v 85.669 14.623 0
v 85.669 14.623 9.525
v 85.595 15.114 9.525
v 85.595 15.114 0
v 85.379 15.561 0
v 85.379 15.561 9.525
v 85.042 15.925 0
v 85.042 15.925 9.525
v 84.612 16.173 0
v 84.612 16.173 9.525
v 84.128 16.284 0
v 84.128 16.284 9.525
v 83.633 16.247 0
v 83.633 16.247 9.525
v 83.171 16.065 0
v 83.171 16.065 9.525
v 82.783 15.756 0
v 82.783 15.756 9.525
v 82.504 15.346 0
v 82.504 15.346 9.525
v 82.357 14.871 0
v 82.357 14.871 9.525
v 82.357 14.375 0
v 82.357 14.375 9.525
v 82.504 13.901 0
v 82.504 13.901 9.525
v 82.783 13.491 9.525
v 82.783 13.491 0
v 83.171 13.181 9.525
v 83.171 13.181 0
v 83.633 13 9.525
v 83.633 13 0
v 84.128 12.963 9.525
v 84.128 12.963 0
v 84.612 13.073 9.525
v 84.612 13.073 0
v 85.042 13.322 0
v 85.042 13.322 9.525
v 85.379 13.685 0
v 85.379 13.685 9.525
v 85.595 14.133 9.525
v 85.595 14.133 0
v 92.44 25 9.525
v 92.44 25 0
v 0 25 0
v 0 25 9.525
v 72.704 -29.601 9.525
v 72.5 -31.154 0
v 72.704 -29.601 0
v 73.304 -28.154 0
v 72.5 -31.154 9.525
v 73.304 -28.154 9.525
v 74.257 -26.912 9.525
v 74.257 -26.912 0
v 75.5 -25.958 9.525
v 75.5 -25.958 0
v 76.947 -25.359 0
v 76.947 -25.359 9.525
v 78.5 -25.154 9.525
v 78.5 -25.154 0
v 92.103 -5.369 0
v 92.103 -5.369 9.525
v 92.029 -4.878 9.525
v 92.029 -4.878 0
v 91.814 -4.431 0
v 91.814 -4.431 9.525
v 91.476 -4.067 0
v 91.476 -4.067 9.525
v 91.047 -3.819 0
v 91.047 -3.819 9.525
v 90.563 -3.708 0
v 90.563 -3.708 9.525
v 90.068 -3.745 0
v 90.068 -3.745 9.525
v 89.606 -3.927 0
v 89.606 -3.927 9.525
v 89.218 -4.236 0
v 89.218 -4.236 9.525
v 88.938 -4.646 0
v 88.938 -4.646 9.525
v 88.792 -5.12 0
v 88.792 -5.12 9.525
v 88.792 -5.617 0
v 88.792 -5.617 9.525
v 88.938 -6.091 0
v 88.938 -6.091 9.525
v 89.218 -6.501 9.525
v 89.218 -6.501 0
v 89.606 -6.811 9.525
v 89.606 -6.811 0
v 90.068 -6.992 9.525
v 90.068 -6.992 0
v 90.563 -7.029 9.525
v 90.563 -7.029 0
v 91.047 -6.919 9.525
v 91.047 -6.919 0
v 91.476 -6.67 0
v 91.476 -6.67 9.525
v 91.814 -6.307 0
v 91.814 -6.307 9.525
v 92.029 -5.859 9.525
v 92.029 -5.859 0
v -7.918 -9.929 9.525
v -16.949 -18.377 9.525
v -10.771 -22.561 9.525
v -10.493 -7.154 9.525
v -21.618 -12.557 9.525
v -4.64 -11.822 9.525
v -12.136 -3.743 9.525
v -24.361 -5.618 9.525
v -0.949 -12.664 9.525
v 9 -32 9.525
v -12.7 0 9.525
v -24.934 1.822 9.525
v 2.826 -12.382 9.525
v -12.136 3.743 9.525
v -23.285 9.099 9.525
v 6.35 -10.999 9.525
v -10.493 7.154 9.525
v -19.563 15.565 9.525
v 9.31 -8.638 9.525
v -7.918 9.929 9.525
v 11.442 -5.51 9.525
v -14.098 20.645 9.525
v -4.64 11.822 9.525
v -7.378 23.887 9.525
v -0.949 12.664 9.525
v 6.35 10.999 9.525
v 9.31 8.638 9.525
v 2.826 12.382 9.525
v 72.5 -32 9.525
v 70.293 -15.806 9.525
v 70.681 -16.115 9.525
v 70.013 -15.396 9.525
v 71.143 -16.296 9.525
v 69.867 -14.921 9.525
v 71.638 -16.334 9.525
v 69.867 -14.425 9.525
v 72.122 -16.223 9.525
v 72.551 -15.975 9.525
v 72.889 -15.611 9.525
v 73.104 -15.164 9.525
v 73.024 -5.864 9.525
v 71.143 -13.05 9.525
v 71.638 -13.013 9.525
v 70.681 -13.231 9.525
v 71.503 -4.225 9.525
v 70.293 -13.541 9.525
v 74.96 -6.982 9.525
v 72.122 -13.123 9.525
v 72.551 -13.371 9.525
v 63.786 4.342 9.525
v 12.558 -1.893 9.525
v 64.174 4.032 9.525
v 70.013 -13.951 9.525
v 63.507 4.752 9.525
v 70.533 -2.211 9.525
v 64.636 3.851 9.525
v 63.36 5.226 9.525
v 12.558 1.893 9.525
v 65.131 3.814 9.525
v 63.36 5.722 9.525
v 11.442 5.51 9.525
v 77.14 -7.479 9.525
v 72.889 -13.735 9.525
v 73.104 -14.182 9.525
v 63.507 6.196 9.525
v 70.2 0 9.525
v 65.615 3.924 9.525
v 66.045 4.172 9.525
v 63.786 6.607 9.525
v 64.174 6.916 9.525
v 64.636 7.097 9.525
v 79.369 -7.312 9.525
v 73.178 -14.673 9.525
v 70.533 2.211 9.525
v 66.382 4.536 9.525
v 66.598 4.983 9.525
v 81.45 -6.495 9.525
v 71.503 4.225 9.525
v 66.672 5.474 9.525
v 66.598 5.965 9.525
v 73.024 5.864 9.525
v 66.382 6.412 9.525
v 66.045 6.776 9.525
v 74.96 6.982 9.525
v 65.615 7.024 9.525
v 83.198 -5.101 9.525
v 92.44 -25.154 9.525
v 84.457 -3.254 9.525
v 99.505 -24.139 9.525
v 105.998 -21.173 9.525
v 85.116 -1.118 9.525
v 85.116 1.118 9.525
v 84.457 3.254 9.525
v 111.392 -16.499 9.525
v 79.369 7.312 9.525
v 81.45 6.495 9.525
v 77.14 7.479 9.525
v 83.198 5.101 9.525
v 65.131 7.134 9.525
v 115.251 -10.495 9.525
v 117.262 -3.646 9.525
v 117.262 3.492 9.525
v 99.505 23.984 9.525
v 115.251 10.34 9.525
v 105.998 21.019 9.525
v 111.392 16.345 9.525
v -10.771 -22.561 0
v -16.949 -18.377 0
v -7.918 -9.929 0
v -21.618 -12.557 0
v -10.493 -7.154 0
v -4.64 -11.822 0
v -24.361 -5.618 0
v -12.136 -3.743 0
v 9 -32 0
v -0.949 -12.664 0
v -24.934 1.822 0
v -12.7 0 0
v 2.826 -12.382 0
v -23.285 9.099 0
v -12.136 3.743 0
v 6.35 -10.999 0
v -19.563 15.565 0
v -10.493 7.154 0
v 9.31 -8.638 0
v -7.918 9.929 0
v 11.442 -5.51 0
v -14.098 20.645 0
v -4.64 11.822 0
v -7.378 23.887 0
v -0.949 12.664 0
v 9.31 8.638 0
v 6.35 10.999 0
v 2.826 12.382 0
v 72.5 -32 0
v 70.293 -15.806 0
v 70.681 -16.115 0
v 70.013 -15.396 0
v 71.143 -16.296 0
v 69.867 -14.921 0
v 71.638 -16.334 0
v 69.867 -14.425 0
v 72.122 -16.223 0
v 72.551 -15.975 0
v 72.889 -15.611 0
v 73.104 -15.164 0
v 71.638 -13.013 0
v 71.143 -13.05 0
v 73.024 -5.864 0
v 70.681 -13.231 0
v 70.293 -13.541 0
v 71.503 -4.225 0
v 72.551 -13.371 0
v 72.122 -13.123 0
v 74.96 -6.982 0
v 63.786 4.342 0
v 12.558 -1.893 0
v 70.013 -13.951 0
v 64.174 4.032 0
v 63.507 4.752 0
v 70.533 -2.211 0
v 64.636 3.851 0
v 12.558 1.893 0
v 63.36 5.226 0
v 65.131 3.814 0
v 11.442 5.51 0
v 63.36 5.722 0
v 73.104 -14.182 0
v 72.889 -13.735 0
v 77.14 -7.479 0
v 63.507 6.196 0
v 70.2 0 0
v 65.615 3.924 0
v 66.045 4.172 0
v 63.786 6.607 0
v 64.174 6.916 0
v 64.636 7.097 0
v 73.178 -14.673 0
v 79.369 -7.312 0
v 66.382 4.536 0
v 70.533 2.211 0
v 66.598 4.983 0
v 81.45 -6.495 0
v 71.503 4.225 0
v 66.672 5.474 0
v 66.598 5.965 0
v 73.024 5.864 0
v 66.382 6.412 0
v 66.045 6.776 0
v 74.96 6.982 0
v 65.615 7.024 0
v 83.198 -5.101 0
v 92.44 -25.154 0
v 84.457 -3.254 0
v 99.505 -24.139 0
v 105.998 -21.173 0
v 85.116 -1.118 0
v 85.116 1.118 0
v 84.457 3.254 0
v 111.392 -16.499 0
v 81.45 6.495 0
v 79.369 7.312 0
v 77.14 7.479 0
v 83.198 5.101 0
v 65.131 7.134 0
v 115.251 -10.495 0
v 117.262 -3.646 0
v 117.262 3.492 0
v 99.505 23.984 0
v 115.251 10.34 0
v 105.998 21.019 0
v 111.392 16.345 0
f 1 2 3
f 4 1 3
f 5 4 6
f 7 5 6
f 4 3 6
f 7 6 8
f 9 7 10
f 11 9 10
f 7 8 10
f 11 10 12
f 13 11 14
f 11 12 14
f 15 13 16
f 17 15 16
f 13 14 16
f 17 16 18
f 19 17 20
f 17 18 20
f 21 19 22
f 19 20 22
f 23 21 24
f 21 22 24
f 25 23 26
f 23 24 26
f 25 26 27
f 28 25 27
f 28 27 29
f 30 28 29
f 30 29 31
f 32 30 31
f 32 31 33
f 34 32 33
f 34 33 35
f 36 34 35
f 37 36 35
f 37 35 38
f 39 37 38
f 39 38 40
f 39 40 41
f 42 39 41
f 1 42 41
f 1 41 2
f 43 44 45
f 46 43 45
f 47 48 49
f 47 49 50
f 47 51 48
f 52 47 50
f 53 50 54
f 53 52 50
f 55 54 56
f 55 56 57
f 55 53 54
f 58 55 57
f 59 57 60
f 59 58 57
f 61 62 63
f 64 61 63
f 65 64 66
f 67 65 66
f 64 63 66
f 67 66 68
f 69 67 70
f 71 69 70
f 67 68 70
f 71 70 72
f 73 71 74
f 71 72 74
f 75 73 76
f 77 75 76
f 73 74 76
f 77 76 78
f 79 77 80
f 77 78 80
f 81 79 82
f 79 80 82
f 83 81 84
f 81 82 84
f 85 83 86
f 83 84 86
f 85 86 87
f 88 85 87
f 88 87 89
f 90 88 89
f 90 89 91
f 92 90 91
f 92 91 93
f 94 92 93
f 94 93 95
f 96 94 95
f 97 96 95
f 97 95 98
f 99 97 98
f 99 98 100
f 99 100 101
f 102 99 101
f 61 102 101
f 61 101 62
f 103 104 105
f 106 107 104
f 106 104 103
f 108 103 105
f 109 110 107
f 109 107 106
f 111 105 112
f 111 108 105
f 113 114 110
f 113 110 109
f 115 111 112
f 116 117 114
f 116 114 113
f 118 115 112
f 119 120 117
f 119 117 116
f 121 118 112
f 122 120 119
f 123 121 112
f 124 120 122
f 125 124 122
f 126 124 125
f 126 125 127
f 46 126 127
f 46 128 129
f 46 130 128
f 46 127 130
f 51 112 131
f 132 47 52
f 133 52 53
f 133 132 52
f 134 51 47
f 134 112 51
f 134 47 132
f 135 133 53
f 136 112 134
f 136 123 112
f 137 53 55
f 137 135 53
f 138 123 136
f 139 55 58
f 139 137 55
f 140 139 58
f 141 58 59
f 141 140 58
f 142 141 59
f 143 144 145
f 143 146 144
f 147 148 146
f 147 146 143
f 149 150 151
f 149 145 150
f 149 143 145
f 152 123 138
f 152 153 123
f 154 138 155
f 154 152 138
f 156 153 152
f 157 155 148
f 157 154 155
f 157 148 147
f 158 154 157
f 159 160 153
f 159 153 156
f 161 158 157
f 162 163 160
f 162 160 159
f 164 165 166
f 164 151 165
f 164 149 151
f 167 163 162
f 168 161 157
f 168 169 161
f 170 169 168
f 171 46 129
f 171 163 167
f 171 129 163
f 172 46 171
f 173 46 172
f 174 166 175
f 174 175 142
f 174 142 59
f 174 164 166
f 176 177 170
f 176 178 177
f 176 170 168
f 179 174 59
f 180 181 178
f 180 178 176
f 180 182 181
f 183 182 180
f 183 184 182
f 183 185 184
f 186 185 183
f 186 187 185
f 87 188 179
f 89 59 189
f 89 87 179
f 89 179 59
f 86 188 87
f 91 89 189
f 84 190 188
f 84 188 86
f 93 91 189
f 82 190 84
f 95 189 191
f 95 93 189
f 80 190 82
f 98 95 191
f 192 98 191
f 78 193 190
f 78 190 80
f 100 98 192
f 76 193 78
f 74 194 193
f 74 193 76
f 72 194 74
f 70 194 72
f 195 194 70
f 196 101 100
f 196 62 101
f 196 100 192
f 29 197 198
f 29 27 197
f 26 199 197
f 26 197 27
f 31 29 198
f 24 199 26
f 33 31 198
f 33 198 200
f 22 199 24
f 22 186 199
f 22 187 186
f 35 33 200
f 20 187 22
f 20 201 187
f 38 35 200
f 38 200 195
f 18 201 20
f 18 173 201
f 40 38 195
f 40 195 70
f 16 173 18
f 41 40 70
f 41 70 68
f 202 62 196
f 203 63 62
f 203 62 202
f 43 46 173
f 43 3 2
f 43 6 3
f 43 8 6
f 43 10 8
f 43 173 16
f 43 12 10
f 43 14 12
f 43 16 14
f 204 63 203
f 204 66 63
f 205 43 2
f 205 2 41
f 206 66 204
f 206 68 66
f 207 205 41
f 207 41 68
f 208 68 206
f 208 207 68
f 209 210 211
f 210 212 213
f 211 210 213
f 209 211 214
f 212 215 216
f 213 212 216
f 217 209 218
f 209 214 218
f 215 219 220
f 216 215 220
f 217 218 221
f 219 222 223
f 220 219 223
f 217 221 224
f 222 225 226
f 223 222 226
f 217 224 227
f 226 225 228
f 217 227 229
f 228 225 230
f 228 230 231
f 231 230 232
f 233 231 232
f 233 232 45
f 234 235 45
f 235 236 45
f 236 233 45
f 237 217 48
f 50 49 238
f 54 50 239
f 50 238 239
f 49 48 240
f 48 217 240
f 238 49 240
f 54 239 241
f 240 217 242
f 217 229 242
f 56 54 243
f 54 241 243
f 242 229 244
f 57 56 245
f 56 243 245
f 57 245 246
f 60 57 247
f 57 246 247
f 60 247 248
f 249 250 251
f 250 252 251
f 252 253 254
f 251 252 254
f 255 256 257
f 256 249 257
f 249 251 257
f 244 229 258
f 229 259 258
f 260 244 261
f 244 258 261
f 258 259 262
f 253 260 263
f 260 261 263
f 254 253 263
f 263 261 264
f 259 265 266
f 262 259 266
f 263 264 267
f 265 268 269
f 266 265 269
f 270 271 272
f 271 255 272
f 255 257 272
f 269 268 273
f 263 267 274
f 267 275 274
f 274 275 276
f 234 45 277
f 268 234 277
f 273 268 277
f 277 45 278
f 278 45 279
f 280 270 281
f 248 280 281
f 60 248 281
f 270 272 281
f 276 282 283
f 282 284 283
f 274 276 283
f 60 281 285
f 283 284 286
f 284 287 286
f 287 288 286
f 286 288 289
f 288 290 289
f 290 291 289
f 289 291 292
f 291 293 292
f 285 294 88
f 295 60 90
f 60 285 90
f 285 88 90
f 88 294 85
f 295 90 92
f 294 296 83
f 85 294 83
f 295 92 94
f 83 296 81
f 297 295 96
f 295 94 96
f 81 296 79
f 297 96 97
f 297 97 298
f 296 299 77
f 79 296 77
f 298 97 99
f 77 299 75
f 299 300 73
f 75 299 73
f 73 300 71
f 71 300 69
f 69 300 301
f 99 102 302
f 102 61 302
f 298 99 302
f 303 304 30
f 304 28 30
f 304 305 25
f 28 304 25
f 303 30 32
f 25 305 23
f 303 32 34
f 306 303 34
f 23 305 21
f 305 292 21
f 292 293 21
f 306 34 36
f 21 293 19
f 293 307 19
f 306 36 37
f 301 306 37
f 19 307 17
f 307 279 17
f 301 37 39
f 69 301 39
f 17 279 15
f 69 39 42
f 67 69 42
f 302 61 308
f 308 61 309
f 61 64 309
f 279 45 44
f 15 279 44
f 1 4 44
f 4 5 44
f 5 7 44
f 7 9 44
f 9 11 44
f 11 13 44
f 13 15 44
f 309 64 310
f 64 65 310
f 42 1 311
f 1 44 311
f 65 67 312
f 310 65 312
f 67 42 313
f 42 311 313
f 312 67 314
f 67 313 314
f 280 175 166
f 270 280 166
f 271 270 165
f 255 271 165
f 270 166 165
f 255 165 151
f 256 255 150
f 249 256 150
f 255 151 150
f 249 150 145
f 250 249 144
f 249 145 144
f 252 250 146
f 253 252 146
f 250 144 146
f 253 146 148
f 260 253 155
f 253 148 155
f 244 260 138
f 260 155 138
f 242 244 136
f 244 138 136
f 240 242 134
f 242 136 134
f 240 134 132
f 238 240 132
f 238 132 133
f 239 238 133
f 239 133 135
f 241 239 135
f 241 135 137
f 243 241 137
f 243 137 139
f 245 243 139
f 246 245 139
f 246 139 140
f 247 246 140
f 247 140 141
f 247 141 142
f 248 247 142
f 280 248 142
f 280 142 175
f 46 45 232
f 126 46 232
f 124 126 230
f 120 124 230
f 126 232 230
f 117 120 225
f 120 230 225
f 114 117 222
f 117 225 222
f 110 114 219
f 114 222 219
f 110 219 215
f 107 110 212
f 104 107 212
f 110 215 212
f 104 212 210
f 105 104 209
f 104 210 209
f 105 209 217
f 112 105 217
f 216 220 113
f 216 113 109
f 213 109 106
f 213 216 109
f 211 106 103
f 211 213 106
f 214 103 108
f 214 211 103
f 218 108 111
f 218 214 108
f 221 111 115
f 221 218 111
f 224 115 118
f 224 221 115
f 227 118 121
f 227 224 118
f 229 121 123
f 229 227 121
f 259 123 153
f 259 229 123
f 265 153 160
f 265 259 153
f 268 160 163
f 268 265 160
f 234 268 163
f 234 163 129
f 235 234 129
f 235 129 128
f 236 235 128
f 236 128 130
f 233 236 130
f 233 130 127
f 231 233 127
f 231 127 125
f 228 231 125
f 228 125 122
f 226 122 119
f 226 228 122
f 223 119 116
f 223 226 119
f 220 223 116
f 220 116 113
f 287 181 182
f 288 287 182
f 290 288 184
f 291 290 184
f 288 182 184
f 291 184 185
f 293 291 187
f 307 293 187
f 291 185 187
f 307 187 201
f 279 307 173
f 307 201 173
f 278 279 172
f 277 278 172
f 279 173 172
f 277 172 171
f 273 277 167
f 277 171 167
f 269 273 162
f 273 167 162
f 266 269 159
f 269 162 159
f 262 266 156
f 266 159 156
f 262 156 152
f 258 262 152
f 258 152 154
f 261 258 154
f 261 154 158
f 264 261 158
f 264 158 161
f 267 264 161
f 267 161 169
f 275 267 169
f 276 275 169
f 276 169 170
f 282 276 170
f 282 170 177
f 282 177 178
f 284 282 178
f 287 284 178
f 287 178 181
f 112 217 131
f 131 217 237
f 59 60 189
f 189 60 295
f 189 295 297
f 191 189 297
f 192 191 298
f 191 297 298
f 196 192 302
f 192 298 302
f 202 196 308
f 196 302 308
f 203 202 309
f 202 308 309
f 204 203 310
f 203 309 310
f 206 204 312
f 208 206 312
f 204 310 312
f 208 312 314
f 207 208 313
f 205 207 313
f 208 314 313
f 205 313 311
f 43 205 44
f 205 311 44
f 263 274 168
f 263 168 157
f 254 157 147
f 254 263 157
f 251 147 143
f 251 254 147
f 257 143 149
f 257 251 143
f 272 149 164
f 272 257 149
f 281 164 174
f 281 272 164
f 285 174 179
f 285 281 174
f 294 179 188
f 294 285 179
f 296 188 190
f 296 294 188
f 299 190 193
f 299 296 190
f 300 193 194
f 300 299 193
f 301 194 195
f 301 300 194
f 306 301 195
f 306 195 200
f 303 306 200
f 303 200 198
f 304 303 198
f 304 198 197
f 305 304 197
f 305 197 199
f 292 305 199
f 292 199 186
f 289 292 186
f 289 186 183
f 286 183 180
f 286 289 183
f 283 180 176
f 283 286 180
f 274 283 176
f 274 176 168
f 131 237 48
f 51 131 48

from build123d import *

# Parameters (mm, degrees)
SKETCH1_R           = 12.7
SKETCH1_R_2         = 7.5
BOSS_EXTRUDE1_DEPTH = 9.525
FILLET1_R           = 6
SKETCH6_R           = 1.665
CUT_EXTRUDE1_DEPTH  = 123.168257963


with BuildPart() as part:
    # Sketch1 → Boss-Extrude1 (new body)
    with BuildSketch(Plane.XY):
        with BuildLine():
            Line((9, -32), (72.5, -32))
            Line((72.5, -32), (72.5, -25.154302825))
            Line((72.5, -25.154302825), (79.665584639, -25.154302825))
            Line((79.665584639, -25.154302825), (92.440326559, -25.154302825))
            ThreePointArc((92.440326559, -25.154302825), (117.517477972, -0.077151413), (92.440326559, 25))
            Line((92.440326559, 25), (77.7, 25))
            Line((77.7, 25), (0, 25))
            ThreePointArc((0, 25), (-24.382533763, 5.521960459), (-10.771150987, -22.560636215))
            Line((-10.771150987, -22.560636215), (9, -32))
        make_face()
        with Locations(Location((0, 0, 0), (0, 0, 180))):
            Circle(SKETCH1_R, mode=Mode.SUBTRACT)
        with Locations(Location((77.7, 0, 0), (0, 0, 180))):
            Circle(SKETCH1_R_2, mode=Mode.SUBTRACT)
    extrude(amount=BOSS_EXTRUDE1_DEPTH)

    # Fillet1
    fillet1_edges = [part.edges().sort_by_distance(p)[0] for p in [
        (72.5, -25.154302825, 4.7625),
    ]]
    fillet(fillet1_edges, radius=FILLET1_R)

    # Sketch6 → Cut-Extrude1 (cut, through all)
    with BuildSketch(Plane.XY.offset(9.525)):
        with Locations((71.513283589, -14.673233797)):
            Circle(SKETCH6_R)
        with Locations((65.006745214, 5.474046027)):
            Circle(SKETCH6_R)
        with Locations((84.003798538, 14.623316108)):
            Circle(SKETCH6_R)
        with Locations((90.43821159, -5.368599676)):
            Circle(SKETCH6_R)
    extrude(amount=-CUT_EXTRUDE1_DEPTH, mode=Mode.SUBTRACT)


solid = part.part
